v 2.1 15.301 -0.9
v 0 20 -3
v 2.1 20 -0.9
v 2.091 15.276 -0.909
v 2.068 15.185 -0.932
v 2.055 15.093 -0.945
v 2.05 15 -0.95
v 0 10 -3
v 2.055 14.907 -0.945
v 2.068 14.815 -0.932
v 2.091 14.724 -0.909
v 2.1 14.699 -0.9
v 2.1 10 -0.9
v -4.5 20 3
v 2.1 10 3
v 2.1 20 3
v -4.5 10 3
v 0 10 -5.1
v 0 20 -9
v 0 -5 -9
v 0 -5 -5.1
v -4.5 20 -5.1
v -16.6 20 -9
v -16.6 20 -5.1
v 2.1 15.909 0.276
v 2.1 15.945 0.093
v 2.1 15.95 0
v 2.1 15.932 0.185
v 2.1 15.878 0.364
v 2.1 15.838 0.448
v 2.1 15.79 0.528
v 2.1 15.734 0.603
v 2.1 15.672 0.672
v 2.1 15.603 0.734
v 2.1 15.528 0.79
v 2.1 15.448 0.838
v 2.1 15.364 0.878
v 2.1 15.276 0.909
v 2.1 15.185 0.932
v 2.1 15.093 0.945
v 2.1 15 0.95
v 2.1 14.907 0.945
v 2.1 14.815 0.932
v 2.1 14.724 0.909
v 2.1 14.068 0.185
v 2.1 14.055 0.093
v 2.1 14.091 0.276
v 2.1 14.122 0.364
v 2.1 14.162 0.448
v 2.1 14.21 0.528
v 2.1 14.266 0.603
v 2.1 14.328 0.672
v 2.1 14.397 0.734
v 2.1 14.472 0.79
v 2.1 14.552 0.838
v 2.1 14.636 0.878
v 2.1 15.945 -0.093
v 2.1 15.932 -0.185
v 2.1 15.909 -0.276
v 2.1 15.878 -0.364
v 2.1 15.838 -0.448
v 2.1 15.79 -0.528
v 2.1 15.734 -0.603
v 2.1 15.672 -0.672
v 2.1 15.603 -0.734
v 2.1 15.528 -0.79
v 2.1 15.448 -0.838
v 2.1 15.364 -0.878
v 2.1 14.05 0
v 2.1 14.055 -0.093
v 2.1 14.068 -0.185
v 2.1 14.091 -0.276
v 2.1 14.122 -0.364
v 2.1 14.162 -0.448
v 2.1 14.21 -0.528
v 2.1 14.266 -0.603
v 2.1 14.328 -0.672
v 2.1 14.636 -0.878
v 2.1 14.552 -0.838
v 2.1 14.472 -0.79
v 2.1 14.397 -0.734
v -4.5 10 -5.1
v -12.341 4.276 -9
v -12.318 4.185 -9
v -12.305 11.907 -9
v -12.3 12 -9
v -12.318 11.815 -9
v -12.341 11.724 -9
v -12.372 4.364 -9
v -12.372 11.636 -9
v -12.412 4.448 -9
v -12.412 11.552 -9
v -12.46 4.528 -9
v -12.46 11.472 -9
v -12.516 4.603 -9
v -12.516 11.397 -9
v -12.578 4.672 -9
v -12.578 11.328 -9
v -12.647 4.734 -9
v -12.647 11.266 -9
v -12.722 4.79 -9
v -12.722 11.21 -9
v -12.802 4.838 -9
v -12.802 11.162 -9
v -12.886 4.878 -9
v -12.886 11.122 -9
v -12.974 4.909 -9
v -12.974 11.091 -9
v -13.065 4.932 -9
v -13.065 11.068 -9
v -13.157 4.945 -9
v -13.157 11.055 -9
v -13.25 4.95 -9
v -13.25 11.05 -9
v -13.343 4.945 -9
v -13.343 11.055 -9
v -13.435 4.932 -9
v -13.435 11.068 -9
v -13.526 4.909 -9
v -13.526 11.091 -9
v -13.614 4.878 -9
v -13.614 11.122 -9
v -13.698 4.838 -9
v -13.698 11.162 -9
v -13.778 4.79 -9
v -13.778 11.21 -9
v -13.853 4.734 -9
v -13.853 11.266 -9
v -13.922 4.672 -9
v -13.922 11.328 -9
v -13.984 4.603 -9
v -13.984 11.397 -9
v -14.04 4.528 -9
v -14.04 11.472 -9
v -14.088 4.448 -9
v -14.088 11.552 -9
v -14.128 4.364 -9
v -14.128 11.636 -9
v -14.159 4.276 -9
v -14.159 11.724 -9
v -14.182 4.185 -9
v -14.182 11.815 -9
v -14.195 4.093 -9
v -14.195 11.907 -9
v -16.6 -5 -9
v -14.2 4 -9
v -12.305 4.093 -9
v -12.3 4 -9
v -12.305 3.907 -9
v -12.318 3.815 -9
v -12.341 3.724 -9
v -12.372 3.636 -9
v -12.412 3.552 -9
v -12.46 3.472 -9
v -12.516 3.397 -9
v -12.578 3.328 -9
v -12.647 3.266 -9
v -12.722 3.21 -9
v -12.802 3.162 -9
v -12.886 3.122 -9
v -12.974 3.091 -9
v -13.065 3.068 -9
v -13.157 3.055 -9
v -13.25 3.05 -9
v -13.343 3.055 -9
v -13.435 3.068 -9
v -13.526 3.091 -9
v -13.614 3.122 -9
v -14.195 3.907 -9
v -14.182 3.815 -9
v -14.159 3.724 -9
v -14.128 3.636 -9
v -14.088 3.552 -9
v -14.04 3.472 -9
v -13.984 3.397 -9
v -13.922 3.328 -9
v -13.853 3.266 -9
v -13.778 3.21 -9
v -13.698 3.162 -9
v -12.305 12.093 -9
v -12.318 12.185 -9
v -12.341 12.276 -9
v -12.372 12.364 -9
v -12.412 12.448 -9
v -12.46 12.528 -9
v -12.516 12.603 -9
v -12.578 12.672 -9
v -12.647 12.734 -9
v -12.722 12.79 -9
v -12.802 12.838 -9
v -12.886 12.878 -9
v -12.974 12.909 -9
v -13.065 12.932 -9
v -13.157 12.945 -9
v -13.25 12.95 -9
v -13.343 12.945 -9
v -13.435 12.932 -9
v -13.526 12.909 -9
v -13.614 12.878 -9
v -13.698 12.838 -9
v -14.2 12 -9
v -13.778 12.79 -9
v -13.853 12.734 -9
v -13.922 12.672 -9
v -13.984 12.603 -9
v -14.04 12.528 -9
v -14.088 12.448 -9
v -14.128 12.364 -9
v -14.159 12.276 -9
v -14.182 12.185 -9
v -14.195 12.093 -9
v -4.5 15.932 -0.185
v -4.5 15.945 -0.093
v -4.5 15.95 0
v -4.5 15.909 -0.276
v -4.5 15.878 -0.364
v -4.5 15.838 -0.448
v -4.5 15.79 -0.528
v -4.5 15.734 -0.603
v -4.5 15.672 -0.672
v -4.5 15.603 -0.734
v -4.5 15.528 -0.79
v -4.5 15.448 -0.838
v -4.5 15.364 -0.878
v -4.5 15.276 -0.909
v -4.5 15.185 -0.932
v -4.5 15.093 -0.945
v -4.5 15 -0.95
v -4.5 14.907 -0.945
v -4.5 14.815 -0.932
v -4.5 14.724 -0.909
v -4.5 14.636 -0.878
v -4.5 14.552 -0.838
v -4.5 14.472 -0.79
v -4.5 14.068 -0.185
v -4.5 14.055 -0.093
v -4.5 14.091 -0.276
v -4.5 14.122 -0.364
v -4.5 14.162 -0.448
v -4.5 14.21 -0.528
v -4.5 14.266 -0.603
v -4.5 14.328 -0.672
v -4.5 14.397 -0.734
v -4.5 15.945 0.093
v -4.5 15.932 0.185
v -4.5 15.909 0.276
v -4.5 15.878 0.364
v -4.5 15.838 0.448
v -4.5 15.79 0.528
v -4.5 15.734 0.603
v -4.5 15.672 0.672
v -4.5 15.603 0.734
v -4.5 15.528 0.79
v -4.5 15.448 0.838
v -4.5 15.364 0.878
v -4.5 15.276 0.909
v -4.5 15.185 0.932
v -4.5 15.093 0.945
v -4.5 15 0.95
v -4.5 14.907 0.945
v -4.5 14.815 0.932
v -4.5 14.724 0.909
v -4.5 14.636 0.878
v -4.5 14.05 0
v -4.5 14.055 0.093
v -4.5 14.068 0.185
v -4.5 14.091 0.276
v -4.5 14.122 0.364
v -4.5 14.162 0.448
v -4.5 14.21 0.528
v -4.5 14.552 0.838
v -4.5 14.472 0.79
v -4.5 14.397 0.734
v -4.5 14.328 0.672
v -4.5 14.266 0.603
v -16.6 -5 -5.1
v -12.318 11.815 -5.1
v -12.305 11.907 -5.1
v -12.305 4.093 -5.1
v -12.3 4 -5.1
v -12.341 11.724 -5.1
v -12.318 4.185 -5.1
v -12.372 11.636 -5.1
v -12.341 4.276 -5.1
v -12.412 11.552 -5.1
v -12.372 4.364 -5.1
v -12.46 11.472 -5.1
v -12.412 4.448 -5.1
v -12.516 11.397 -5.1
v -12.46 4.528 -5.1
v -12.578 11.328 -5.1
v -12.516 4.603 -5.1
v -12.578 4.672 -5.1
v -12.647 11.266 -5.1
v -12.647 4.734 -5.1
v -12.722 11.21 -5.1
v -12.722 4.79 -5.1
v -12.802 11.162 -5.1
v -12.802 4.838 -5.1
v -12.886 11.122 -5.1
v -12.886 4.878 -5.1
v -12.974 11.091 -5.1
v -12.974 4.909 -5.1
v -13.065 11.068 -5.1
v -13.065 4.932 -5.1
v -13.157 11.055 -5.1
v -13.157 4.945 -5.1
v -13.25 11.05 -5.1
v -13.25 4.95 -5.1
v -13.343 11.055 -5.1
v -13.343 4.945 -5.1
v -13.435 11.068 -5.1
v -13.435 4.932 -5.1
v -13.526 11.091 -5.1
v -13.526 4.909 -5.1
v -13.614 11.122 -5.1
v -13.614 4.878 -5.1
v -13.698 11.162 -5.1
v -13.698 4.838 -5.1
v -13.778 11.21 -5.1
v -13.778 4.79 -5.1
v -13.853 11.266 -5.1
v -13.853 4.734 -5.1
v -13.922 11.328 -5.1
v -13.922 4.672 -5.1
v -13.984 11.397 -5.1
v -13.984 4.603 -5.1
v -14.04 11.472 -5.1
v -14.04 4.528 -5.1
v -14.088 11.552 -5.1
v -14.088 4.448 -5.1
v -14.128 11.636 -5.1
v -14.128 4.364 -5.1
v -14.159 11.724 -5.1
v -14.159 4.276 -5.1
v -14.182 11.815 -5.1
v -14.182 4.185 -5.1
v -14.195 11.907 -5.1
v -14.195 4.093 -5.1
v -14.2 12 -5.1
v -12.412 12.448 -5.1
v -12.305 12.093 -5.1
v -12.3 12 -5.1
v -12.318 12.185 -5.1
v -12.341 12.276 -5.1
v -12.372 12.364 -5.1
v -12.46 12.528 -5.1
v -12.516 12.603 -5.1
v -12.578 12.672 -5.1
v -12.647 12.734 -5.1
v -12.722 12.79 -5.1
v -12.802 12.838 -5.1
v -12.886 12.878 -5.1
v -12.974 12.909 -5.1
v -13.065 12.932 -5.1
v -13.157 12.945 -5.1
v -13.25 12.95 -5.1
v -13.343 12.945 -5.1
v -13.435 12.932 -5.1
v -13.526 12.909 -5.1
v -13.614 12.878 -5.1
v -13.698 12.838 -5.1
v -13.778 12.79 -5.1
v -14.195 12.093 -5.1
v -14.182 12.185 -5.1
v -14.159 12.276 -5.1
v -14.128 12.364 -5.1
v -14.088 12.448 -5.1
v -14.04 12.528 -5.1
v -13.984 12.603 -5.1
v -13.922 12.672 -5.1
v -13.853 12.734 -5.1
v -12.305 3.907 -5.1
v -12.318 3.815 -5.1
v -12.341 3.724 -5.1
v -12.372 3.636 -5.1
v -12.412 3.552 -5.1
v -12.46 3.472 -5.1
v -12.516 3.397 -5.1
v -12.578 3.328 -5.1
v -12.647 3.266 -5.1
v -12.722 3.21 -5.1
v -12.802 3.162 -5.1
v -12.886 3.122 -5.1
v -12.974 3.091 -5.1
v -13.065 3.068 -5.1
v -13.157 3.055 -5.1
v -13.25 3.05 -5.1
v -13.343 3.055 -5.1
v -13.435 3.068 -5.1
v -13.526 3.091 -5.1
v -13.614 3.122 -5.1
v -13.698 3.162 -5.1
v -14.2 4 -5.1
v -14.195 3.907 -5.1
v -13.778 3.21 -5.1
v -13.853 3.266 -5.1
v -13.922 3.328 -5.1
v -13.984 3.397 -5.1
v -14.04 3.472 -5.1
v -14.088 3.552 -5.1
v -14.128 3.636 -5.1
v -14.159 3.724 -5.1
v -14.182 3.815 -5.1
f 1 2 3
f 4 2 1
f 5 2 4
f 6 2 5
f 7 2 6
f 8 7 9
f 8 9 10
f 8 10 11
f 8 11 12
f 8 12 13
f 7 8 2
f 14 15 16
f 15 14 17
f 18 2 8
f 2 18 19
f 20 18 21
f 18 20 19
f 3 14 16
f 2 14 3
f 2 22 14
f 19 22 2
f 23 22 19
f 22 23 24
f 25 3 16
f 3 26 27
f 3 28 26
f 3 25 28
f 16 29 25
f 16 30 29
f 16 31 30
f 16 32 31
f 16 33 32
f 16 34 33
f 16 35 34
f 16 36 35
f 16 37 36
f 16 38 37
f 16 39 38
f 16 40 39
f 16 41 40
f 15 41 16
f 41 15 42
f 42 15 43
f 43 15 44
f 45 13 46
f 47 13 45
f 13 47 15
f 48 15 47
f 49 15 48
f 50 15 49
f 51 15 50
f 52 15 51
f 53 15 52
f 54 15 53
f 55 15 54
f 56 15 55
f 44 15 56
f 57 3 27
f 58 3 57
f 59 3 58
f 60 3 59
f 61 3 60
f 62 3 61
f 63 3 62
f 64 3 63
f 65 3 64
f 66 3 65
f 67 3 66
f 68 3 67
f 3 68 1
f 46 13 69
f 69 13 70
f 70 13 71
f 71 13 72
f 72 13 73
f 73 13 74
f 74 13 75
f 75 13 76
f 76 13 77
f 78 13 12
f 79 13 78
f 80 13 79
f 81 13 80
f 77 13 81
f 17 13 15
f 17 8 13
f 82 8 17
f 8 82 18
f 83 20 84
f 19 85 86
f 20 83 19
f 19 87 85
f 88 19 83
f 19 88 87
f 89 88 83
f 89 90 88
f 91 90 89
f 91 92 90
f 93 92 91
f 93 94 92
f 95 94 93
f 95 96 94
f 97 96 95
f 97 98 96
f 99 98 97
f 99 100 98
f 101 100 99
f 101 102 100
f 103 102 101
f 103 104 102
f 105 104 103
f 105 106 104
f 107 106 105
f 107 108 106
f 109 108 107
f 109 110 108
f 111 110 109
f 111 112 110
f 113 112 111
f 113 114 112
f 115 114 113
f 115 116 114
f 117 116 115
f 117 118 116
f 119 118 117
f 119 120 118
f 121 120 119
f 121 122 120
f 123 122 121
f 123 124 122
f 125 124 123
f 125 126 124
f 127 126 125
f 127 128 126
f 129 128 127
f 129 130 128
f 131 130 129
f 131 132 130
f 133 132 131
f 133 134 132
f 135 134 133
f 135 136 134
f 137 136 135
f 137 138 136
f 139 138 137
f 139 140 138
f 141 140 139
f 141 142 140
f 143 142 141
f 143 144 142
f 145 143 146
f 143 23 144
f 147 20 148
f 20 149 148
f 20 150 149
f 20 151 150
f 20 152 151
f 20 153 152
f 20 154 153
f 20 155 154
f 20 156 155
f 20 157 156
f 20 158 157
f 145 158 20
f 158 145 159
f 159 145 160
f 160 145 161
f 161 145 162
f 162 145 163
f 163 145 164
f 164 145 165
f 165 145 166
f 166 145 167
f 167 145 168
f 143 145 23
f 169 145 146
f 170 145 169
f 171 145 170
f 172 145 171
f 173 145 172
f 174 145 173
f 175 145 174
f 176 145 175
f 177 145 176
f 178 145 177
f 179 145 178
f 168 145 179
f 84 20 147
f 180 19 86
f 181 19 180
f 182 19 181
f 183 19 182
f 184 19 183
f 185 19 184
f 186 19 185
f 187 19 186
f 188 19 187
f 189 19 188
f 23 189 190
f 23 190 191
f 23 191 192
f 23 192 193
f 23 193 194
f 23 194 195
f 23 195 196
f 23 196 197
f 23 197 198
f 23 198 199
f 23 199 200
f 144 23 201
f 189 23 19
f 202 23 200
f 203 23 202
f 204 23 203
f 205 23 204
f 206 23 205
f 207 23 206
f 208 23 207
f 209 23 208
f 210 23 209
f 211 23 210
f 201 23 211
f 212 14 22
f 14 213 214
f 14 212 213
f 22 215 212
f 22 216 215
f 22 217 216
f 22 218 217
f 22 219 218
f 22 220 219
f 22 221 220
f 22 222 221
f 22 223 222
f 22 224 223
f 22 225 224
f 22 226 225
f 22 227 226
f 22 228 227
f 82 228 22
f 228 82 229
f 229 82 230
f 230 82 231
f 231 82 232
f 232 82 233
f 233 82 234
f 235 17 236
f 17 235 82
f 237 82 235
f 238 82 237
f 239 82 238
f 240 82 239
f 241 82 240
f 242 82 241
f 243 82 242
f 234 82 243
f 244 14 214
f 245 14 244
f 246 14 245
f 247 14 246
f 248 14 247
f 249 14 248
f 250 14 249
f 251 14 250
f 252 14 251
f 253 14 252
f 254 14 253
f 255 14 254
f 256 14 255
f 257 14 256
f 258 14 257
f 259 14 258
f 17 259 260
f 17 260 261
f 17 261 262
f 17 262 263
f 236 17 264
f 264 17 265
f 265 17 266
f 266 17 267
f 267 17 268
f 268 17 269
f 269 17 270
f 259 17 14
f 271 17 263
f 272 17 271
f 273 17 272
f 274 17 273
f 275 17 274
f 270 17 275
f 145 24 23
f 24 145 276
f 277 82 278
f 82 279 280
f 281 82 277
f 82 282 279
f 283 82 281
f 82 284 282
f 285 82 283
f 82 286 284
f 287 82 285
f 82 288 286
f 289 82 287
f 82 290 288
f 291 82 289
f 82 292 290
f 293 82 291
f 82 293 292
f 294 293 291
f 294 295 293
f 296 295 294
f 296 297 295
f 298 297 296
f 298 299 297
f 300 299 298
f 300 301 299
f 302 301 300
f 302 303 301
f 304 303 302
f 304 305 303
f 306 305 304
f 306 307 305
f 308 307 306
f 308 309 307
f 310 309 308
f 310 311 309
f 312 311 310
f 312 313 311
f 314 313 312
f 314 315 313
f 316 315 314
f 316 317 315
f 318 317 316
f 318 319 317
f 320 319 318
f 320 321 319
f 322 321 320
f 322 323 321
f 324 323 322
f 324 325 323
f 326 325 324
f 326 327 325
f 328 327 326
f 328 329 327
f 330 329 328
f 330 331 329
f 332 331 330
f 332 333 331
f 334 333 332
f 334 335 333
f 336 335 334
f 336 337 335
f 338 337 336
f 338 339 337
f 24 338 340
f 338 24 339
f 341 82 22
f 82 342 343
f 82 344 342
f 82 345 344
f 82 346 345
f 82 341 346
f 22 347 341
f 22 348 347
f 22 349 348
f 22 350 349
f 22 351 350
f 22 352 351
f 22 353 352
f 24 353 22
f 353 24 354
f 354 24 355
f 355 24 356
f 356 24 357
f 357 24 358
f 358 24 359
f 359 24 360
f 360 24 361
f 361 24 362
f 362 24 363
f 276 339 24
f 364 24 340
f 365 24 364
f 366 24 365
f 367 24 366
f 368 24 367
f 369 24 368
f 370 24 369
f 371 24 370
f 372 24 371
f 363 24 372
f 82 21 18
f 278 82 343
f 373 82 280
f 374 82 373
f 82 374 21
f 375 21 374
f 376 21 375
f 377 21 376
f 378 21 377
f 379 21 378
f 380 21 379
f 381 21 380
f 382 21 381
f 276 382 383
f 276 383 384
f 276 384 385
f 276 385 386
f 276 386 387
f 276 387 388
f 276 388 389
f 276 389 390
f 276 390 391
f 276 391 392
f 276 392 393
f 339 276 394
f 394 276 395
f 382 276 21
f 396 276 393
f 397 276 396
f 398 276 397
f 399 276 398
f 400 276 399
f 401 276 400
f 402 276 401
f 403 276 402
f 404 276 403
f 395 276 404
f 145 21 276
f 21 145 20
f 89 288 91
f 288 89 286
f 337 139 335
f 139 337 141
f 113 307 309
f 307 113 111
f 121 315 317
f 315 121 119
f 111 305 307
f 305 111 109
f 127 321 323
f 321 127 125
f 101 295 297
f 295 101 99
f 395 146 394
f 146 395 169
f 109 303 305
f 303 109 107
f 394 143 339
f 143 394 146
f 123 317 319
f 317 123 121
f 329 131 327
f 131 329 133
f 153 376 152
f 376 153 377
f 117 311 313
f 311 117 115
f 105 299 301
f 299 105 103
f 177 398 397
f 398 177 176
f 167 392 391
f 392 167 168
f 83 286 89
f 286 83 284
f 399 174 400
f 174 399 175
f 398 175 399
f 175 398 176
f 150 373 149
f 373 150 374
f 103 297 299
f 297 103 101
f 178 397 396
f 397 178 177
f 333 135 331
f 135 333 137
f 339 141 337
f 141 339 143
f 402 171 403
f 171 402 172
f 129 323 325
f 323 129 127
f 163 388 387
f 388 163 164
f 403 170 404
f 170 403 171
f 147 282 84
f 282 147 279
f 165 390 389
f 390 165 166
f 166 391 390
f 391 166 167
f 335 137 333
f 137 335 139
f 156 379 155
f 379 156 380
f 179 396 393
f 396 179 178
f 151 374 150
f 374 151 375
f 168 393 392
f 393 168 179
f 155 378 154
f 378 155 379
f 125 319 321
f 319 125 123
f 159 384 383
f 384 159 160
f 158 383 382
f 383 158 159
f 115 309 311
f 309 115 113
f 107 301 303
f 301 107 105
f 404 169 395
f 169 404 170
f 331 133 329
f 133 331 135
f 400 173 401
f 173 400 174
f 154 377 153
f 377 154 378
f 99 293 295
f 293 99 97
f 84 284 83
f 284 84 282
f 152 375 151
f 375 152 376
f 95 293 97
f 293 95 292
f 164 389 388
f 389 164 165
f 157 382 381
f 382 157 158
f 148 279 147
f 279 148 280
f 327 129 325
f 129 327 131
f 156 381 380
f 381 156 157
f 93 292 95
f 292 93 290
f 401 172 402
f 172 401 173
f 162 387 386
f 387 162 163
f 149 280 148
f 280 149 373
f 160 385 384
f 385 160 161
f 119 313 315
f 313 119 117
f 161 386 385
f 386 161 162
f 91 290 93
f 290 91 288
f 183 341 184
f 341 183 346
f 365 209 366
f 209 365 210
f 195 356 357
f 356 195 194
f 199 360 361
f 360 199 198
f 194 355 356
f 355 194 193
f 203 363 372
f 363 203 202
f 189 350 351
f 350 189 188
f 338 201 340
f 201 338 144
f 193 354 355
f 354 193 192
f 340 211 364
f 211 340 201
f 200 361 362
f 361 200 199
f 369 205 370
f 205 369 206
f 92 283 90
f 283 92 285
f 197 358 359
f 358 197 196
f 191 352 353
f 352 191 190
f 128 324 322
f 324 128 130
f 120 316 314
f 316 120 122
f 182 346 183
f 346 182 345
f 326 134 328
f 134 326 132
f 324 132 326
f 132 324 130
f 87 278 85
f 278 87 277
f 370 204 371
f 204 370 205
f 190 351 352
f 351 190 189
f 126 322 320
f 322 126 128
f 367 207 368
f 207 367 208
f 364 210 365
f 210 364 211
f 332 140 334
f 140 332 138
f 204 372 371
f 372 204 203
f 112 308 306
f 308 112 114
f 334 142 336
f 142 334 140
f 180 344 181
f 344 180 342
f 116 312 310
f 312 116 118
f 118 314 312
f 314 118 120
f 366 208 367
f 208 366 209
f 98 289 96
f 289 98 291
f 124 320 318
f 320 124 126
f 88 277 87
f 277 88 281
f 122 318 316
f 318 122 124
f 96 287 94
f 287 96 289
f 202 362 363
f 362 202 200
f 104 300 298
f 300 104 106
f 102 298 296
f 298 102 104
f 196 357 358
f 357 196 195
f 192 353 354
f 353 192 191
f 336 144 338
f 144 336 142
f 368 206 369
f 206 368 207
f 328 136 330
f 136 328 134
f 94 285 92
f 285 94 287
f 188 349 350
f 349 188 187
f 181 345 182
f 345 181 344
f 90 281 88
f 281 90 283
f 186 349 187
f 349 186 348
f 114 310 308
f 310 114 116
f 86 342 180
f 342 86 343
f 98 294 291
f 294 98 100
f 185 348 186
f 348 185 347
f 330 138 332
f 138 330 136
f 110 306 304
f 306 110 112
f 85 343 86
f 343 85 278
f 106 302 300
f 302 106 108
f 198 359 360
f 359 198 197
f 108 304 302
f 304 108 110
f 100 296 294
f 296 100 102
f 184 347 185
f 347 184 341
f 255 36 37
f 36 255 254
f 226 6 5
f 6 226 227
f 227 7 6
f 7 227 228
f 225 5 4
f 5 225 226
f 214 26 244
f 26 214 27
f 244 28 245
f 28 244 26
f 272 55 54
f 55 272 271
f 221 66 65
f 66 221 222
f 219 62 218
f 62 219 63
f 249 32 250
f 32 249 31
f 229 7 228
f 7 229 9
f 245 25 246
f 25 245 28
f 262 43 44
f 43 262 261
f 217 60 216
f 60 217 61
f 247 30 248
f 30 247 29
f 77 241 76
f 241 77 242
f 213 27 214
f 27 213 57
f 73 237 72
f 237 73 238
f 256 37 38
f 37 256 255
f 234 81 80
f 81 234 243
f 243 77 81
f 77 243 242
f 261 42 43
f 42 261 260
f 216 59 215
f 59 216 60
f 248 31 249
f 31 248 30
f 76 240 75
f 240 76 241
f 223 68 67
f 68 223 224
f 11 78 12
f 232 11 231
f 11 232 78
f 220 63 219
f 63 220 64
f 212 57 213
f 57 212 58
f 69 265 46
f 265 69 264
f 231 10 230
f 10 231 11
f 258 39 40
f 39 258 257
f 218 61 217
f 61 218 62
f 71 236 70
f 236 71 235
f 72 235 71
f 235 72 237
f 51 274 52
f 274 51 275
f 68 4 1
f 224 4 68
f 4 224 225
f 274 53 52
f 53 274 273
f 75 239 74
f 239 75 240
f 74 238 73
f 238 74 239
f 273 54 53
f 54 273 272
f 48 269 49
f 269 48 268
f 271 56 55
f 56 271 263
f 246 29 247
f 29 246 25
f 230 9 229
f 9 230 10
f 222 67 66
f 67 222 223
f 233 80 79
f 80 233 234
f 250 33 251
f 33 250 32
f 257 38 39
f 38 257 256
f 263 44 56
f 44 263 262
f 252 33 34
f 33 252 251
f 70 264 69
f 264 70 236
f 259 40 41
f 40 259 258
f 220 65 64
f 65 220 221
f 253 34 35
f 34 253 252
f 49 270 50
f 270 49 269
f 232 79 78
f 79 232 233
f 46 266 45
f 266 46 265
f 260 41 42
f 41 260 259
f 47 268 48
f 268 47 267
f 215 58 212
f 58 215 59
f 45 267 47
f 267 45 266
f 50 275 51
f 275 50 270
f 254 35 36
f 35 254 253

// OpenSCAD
// file: ../generated/config.scad
// GENERATED by tools/build.py from config/rack.yaml — do not edit.

FRAME_W = 670.6;
FRAME_D = 225.335;
FRAME_TILT = 20;
FRAME_ROW_Y0 = 25;
FRAME_BASE_H = 80;
FRAME_TOP_Z = 410;
FRAME_PANEL_T = 7.4;
FRAME_PANEL_CLEAR = 0.2;
ROW_IDS = ["A", "B"];
ROW_HEIGHTS = [165, 165];
ROW_LAYOUTS = [[1, 1, 1, 1], [1, 1, 1, 1]];
BAY_PITCH = 165.8;
CARRIER_W = 158;
CARRIER_D = 210;
CARRIER_BOTTOM = 2.5;
CARRIER_WALL = 2;
CARRIER_STANDOFF = 5;
CARRIER_DECK = 3;
CARRIER_FASCIA = 2.5;
CARRIER_WALL_H = 20.1;
CARRIER_PLENUM = 23.1;
PCB_TO_FLOOR = 14;
CAM_MOUNT = [109, 45, 30];
CAM_LENS = [64, 27.6];
DRAWER_D = 208;
DRAWER_W = 142;
DRAWER_X0 = 8;
DRAWER_TRAVEL = 140;
DRAWER_GUIDE_W = 7.5;
DRAWER_CLEAR = 0.5;
DRAWER_BOTTOM = 2.5;
DRAWER_WALL = 2;
DRAWER_WALL_H = 16;
DRAWER_FRONT_H = 30;
DRAWER_FRONT_T = 4;
DRAWER_REAR_BAY = 42;
DRAWER_FLANGE = [3, 3];
DRAWER_MAGNET = [6, 3];
DATA_PORT_X = [80];
PLATE_T = 5;
HEX_PITCH = 10;
HEX_AF = 7.2;
HEX_U = 0.4;
HEX_CLEAR = 0.1;
HEX_HOLES = [[23.7, 10.418], [33.7, 10.418], [43.7, 10.418], [53.7, 10.418], [63.7, 10.418], [73.7, 10.418], [83.7, 10.418], [93.7, 10.418], [103.7, 10.418], [113.7, 10.418], [123.7, 10.418], [8.7, 19.078], [18.7, 19.078], [28.7, 19.078], [38.7, 19.078], [48.7, 19.078], [58.7, 19.078], [68.7, 19.078], [78.7, 19.078], [88.7, 19.078], [98.7, 19.078], [108.7, 19.078], [118.7, 19.078], [128.7, 19.078], [13.7, 27.738], [23.7, 27.738], [33.7, 27.738], [43.7, 27.738], [53.7, 27.738], [63.7, 27.738], [73.7, 27.738], [83.7, 27.738], [93.7, 27.738], [103.7, 27.738], [113.7, 27.738], [123.7, 27.738], [8.7, 36.399], [18.7, 36.399], [28.7, 36.399], [38.7, 36.399], [48.7, 36.399], [58.7, 36.399], [68.7, 36.399], [78.7, 36.399], [88.7, 36.399], [98.7, 36.399], [108.7, 36.399], [118.7, 36.399], [128.7, 36.399], [13.7, 45.059], [23.7, 45.059], [33.7, 45.059], [43.7, 45.059], [53.7, 45.059], [63.7, 45.059], [73.7, 45.059], [83.7, 45.059], [93.7, 45.059], [103.7, 45.059], [113.7, 45.059], [123.7, 45.059], [8.7, 53.719], [18.7, 53.719], [28.7, 53.719], [38.7, 53.719], [48.7, 53.719], [58.7, 53.719], [68.7, 53.719], [78.7, 53.719], [88.7, 53.719], [98.7, 53.719], [108.7, 53.719], [118.7, 53.719], [128.7, 53.719], [23.7, 62.379], [33.7, 62.379], [43.7, 62.379], [53.7, 62.379], [63.7, 62.379], [73.7, 62.379], [83.7, 62.379], [93.7, 62.379], [103.7, 62.379], [113.7, 62.379], [123.7, 62.379], [28.7, 71.04], [38.7, 71.04], [48.7, 71.04], [58.7, 71.04], [68.7, 71.04], [78.7, 71.04], [88.7, 71.04], [98.7, 71.04], [108.7, 71.04], [33.7, 79.7], [43.7, 79.7], [53.7, 79.7], [63.7, 79.7], [73.7, 79.7], [83.7, 79.7], [93.7, 79.7], [103.7, 79.7], [28.7, 88.36], [38.7, 88.36], [48.7, 88.36], [58.7, 88.36], [68.7, 88.36], [78.7, 88.36], [88.7, 88.36], [98.7, 88.36], [108.7, 88.36], [13.7, 97.021], [23.7, 97.021], [33.7, 97.021], [43.7, 97.021], [53.7, 97.021], [63.7, 97.021], [73.7, 97.021], [83.7, 97.021], [93.7, 97.021], [103.7, 97.021], [113.7, 97.021], [123.7, 97.021], [8.7, 105.681], [18.7, 105.681], [28.7, 105.681], [38.7, 105.681], [48.7, 105.681], [58.7, 105.681], [68.7, 105.681], [78.7, 105.681], [88.7, 105.681], [98.7, 105.681], [108.7, 105.681], [118.7, 105.681], [128.7, 105.681], [13.7, 114.341], [23.7, 114.341], [33.7, 114.341], [43.7, 114.341], [53.7, 114.341], [63.7, 114.341], [73.7, 114.341], [83.7, 114.341], [93.7, 114.341], [103.7, 114.341], [113.7, 114.341], [123.7, 114.341], [8.7, 123.001], [18.7, 123.001], [28.7, 123.001], [38.7, 123.001], [48.7, 123.001], [58.7, 123.001], [68.7, 123.001], [78.7, 123.001], [88.7, 123.001], [98.7, 123.001], [108.7, 123.001], [118.7, 123.001], [128.7, 123.001], [13.7, 131.662], [23.7, 131.662], [33.7, 131.662], [43.7, 131.662], [53.7, 131.662], [63.7, 131.662], [73.7, 131.662], [83.7, 131.662], [93.7, 131.662], [103.7, 131.662], [113.7, 131.662], [123.7, 131.662], [8.7, 140.322], [18.7, 140.322], [28.7, 140.322], [38.7, 140.322], [48.7, 140.322], [58.7, 140.322], [68.7, 140.322], [78.7, 140.322], [88.7, 140.322], [98.7, 140.322], [108.7, 140.322], [118.7, 140.322], [128.7, 140.322], [13.7, 148.982], [23.7, 148.982], [33.7, 148.982], [43.7, 148.982], [53.7, 148.982], [63.7, 148.982], [73.7, 148.982], [83.7, 148.982], [93.7, 148.982], [103.7, 148.982], [113.7, 148.982]];
HEX_ROWS = [[1, 10.418], [2, 19.078], [3, 27.738], [4, 36.399], [5, 45.059], [6, 53.719], [7, 62.379], [8, 71.04], [9, 79.7], [10, 88.36], [11, 97.021], [12, 105.681], [13, 114.341], [14, 123.001], [15, 131.662], [16, 140.322], [17, 148.982]];
PEG_STOP = [3.55, 15, 4.6, 7, 7.6];
PEG_CAM = [3, 6.75, 270, 20];
CHAIN_INNER = [7, 7];
CHAIN_OUTER = [13.5, 10.2];
CHAIN_R = 18;
CHAIN_PITCH = 16;
CHAIN_END_HOLES = [8, 4];
CHAIN_FIXED = [100, 87];
CHAIN_MOVING_X = 136;
CHAIN_FOOT_Y = 172;
CHAIN_MOVING_Y = 157;
CHAIN_END_LENGTH = 26;
CHAIN_BEND_Y = 183;
NODE_SIZE = [74, 90];
NODE_T = 1.6;
NODE_HOLES = [[3.5, 13.5], [70.5, 13.5], [3.5, 86.5], [70.5, 86.5]];
NODE_X0 = 4;
NODE_FRONT_Y = 3;
NODE_PCB_TOP = 9.1;
NODE_FRONT = [32, 12, 50];
NODE_PWR_Y = 73;
NODE_DATA_Y = 30;
NODE_AUX = [69.1, 50.6];
NODE_CAM = [59, 17.2];
DATA_PCB_SIZE = [40, 17];
DATA_PCB_T = 1.6;
DATA_PCB_HOLES = [[2.6, 13.5], [37.5, 4]];
DATA_PCB_USB = 30.5;
DATA_PCB_PH = 14.4;
DATA_X4_SIZE = [100, 37];
DATA_X4_X0 = 15;
DATA_X4_HOLES = [[3.2, 16.5], [38.7, 16.5], [81.4, 16.3]];
DATA_X4_USB = [11, 29, 47, 65];
DATA_X4_LEAD = [95.1, 20];
POD_PCB_SIZE = [40, 27];
POD_PCB_T = 1.6;
POD_PCB_HOLES = [[2.6, 13], [26.5, 23.5]];
POD_LEDS = [5, 11, 17, 23];
POD_LED_Y = 3.2;
POD_LEAD_Y = 13;
POD_HEADER = [13, 21];
HUB_SIZE = [76, 100];
HUB_HOLES = [[3.5, 3.5], [72, 4], [4, 93.5], [72, 86]];
HUB_T = 1.6;
HUB_X0 = 3.6;
HUB_FRONT_GAP = 1.2;
HUB_Z = 19;
HUB_ROWS = [81, 63.5, 46, 28.5];
HUB_LEDS = [11, 23, 35, 47, 55.6, 61.6];
HUB_USB = 70;
HUB_PD = 62;
HUB_BUTTONS = [[11.5, 10], [11.5, 16.5]];
PBOX_COLUMN = 0;
PBOX_SIZE = [84, 108, 35];
PBOX_WALL = 2.4;
PBOX_X = 3;
// file: ../lib/common.scad
// Shared helpers for every printed part of hw-testing-rack.
include <../generated/config.scad>

$fn = $preview ? 32 : 64;
EPS = 0.01;

// Heat-set inserts (Ruthex-style).  Hole Ø is the recommended pre-hole.
INSERT_M3 = [4.0, 5.7];    // [hole Ø, depth]
INSERT_M2 = [3.2, 4.0];
INSERT_M25 = [3.6, 4.5];
M3_CLEAR = 3.4;
M5_CLEAR = 5.5;
M3_HEAD = [6.0, 3.0];      // DIN 912 / ISO 7380 head Ø × height (button head ~5.7)
// The rack's four screw types (docs/printed-parts-review.md, finding 13): M3 × 8 into inserts, nuts and
// spacers; PT 2.3 × 8 thread-forming into printed pilots; the M3 spacers; M2.5 washers
PT_PILOT = 1.9;            // a PT 2.3's pilot (≈ 0.8 × d)
PT_CLEAR = 2.6;            // and its clearance hole

module rbox(size, r = 2, center = false) {
    // Box with rounded vertical edges.
    translate(center ? [-size[0] / 2, -size[1] / 2, 0] : [0, 0, 0])
        hull() for (x = [r, size[0] - r], y = [r, size[1] - r])
            translate([x, y, 0]) cylinder(r = r, h = size[2]);
}

module rslot(len, w, h) {
    // Stadium-shaped slot along X, centred on the origin.
    hull() for (x = [-(len - w) / 2, (len - w) / 2]) translate([x, 0, 0]) cylinder(d = w, h = h);
}

module insert_hole(spec = INSERT_M3, runout = 0) {
    // Pocket for a heat-set insert, opening at z=0 and going -Z; `runout`: an M3 clearance hole that
    // carries on past it, so an M3 × 8 that goes deeper than the insert doesn't bottom on the plastic
    translate([0, 0, -spec[1]]) cylinder(d = spec[0], h = spec[1] + EPS);
    translate([0, 0, -0.6]) cylinder(d1 = spec[0], d2 = spec[0] + 0.8, h = 0.6 + EPS);
    if (runout > 0) translate([0, 0, -spec[1] - runout]) cylinder(d = M3_CLEAR, h = runout + EPS);
}

module screw_through(d = M3_CLEAR, h = 20, head = M3_HEAD, counterbore = true) {
    // Clearance hole along +Z from z=0, with an optional counterbore at z=h.
    translate([0, 0, -EPS]) cylinder(d = d, h = h + 2 * EPS);
    if (counterbore) translate([0, 0, h - head[1]]) cylinder(d = head[0] + 0.4, h = head[1] + EPS);
}

module magnet_pocket(d = DRAWER_MAGNET[0], t = DRAWER_MAGNET[1]) {
    // Slip-fit pocket for a glued disc magnet (docs/mechanical.md), opening at z=0 going -Z.
    translate([0, 0, -t - 0.2]) cylinder(d = d + 0.25, h = t + 0.2 + EPS);
}

module label_text(txt, size = 6, depth = 0.6, font = "Liberation Sans:style=Bold") {
    linear_extrude(depth) text(txt, size = size, font = font, halign = "center", valign = "center");
}
// main file
// Drag-chain hardware for the drawer cable (7×7 mm chain lying flat in the plenum).
//
//   -D 'PART="foot"'    drawer foot: tongue in the drawer's groove, fin for the moving end
//   -D 'PART="anchor"'  fixed-end block, screwed to the tray (2 × M3 into inserts)
//   -D 'PART="link"'    optional printable link if you don't buy a chain
//   -D 'PART="bar"'     its removable bar (one per link): slide it out to lay the cable in
//
// The reference chain (Olimex DRAG-CHAIN-7X7, links open on both sides) ends in two end
// pieces with a tab flush with the outer face of the U and two holes 8 mm apart along the
// chain (config/rack.yaml › chain.end_holes).  Each tab screws to the inner face of the anchor
// or of the foot's fin with 2 × PT 2.3 × 8 (thread-forming) and washers
// (the tab holes may be up to 4.3 mm).  Screw the end pieces on at the bench, then fit the anchor and the foot.
// Print: anchor and bar as modelled, foot on its fin, link on its fixed bar; PETG, no supports.
include <../lib/carrier.scad>

PART = "foot";
TONGUE = [6, 10];                     // X × Y of the tongue in the drawer's foot groove
TONGUE_H = 2.1;                       // the groove is 2.3 deep
PILOT = PT_PILOT;                     // a PT 2.3 × 8 thread-forming screw's pilot

// ------------------------------------------------------------------ foot
// Foot coordinates: origin on the moving run's axis, at the chain's mouth (y), on the drawer's
// underside (z = CARRIER_PLENUM in the tray).  The fin stands outside the moving run, 1 mm clear
// of the right ledge, along the end piece; a bridge over the chain joins it to the tongue, which
// sits LOCK behind the mouth, under the drawer's rear bay (its lock screw goes in from there).
// The extension leaves the mouth forwards and curls back over the end piece, left of the
// bridge, into the rear bay's cable window.
LOCK = CHAIN_FOOT_Y - CHAIN_MOVING_Y;
FIN_X = [CHAIN_H / 2, CARRIER_W - (DRAWER_X0 + 4) - CHAIN_MOVING_X - 1];
FIN_Y = [-TONGUE[1] / 2, max(chain_end_holes(0)[1] + 6, LOCK + TONGUE[1] / 2)];
FIN_Z0 = CARRIER_BOTTOM + 4 - CARRIER_PLENUM;           // 1 mm above the tray's chain rails
BRIDGE_Z0 = CHAIN_Z + CHAIN_W / 2 + 2 - CARRIER_PLENUM; // 2 mm above the chain
module foot() {
    difference() {
        union() {
            // tongue, its +x edge chamfered (printed on the fin, that edge is underneath)
            translate([0, LOCK - TONGUE[1] / 2, 0]) rotate([90, 0, 0]) mirror([0, 0, 1]) linear_extrude(TONGUE[1])
                polygon([[-TONGUE[0] / 2, 0], [TONGUE[0] / 2, 0], [TONGUE[0] / 2 - TONGUE_H, TONGUE_H], [-TONGUE[0] / 2, TONGUE_H]]);
            translate([-TONGUE[0] / 2, LOCK - TONGUE[1] / 2, BRIDGE_Z0]) cube([FIN_X[1] + TONGUE[0] / 2, TONGUE[1], -BRIDGE_Z0]);
            translate([FIN_X[0], FIN_Y[0], FIN_Z0]) cube([FIN_X[1] - FIN_X[0], FIN_Y[1] - FIN_Y[0], -FIN_Z0]);
        }
        // lock screw (PT 2.3 × 8, down from the drawer's rear bay)
        translate([0, LOCK, TONGUE_H - 8]) cylinder(d = PILOT, h = 9);
        // the end piece's tab holes
        for (y = chain_end_holes(0)) translate([FIN_X[0] - EPS, y, CHAIN_Z - CARRIER_PLENUM]) rotate([0, 90, 0]) cylinder(d = PILOT, h = 10);
    }
}

// ------------------------------------------------------------------ anchor
// Anchor coordinates: origin on the fixed run's axis, at the chain's mouth (y), on top of
// the tray's insert bosses.  The block's inner face is the fixed run's outer face.  Its underside stays
// 3 mm over the tray's floor (ANCHOR_BASE: the end piece's pilots keep their wall below), the bosses
// standing 2 mm up into two pockets in it
ANCHOR_BASE = CARRIER_BOTTOM + 3;
module anchor() {
    o = [CHAIN_FIXED_RUN_X, CHAIN_FIXED[1], ANCHOR_Z0];
    h = CHAIN_Z + CHAIN_W / 2 - ANCHOR_BASE;
    difference() {
        translate([ANCHOR_X1 - ANCHOR[0], ANCHOR_Y0, ANCHOR_BASE] - o) rbox([ANCHOR[0], ANCHOR[1], h], r = 1.5);
        // M3 × 8 into the tray's inserts, heads sunk to leave 3 mm under them
        for (b = ANCHOR_BOSSES) translate(concat(b, [ANCHOR_Z0]) - o) {
            translate([0, 0, ANCHOR_BASE - ANCHOR_Z0 - EPS]) cylinder(d = 7.5 + 0.4, h = ANCHOR_Z0 - ANCHOR_BASE + EPS);
            translate([0, 0, -EPS]) cylinder(d = M3_CLEAR, h = h + 2 * EPS);
            translate([0, 0, 3]) cylinder(d = M3_HEAD[0] + 0.4, h = h);
        }
        for (y = chain_end_holes(CHAIN_FIXED[1])) translate([ANCHOR_X1 + EPS, y, CHAIN_Z] - o) rotate([0, -90, 0]) cylinder(d = PILOT, h = 7);
    }
}

// ------------------------------------------------------------------ link
// Lying as in the rack: chain axis X, pins vertical (Z), a side plate of (outer - inner) / 2 at
// the bottom and at the top.  At a joint the plates overlap at half thickness: the pin on the
// inner half of one link snaps into the outer half of the next.  One bar belongs to the link;
// the other slides into two pockets from the outside (PART = "bar").  No bend stops: in the
// plenum the two runs and the rails hold the U.
LINK_P = CHAIN_PITCH;
LINK_R = CHAIN_H / 2;                             // rounded plate ends around the pins
LINK_T = (CHAIN_W - CHAIN_INNER[1]) / 2;          // side plate
LINK_B = (CHAIN_H - CHAIN_INNER[0]) / 2;          // bar
LINK_C = 0.3;                                     // joint clearance
LINK_MID = [LINK_R + LINK_C, LINK_P - LINK_R - LINK_C];   // x span of the full-thickness middle
POCKET = 1;                                       // bar pocket depth in each plate

module link_plate_2d(half) {      // "outer": female end + middle, "inner": middle + male end
    hull() {
        translate([LINK_MID[0], -LINK_R]) square([LINK_MID[1] - LINK_MID[0], 2 * LINK_R]);
        translate([half == "outer" ? 0 : LINK_P, 0]) circle(r = LINK_R);
    }
}
module link_plate() {             // bottom plate, z = 0 .. LINK_T
    difference() {
        union() {
            linear_extrude(LINK_T / 2) link_plate_2d("outer");
            translate([0, 0, LINK_T / 2]) linear_extrude(LINK_T / 2) link_plate_2d("inner");
            translate([LINK_P, 0, 0.1]) cylinder(d1 = 2.2, d2 = 2.6, h = LINK_T / 2 - 0.1 + EPS);   // pin, tip chamfered
        }
        translate([0, 0, -EPS]) cylinder(d = 2.9, h = LINK_T / 2 + 2 * EPS);                      // the previous link's pin
        translate([LINK_MID[0] - EPS, LINK_R - LINK_B - 0.15, LINK_T - POCKET]) cube([LINK_MID[1] - LINK_MID[0] + 2 * EPS, LINK_B + 0.15 + EPS, POCKET + EPS]);
    }
}
module link() {
    link_plate();
    translate([0, 0, CHAIN_W]) mirror([0, 0, 1]) link_plate();
    translate([LINK_MID[0], -LINK_R, LINK_T - EPS]) cube([LINK_MID[1] - LINK_MID[0], LINK_B, CHAIN_W - 2 * LINK_T + 2 * EPS]);
}
module bar() cube([LINK_MID[1] - LINK_MID[0] - 0.2, CHAIN_INNER[1] + 2 * POCKET - 0.1, LINK_B]);

if (PART == "foot") rotate([0, 90, 0]) foot();
else if (PART == "anchor") anchor();
else if (PART == "bar") bar();
else rotate([90, 0, 0]) link();
